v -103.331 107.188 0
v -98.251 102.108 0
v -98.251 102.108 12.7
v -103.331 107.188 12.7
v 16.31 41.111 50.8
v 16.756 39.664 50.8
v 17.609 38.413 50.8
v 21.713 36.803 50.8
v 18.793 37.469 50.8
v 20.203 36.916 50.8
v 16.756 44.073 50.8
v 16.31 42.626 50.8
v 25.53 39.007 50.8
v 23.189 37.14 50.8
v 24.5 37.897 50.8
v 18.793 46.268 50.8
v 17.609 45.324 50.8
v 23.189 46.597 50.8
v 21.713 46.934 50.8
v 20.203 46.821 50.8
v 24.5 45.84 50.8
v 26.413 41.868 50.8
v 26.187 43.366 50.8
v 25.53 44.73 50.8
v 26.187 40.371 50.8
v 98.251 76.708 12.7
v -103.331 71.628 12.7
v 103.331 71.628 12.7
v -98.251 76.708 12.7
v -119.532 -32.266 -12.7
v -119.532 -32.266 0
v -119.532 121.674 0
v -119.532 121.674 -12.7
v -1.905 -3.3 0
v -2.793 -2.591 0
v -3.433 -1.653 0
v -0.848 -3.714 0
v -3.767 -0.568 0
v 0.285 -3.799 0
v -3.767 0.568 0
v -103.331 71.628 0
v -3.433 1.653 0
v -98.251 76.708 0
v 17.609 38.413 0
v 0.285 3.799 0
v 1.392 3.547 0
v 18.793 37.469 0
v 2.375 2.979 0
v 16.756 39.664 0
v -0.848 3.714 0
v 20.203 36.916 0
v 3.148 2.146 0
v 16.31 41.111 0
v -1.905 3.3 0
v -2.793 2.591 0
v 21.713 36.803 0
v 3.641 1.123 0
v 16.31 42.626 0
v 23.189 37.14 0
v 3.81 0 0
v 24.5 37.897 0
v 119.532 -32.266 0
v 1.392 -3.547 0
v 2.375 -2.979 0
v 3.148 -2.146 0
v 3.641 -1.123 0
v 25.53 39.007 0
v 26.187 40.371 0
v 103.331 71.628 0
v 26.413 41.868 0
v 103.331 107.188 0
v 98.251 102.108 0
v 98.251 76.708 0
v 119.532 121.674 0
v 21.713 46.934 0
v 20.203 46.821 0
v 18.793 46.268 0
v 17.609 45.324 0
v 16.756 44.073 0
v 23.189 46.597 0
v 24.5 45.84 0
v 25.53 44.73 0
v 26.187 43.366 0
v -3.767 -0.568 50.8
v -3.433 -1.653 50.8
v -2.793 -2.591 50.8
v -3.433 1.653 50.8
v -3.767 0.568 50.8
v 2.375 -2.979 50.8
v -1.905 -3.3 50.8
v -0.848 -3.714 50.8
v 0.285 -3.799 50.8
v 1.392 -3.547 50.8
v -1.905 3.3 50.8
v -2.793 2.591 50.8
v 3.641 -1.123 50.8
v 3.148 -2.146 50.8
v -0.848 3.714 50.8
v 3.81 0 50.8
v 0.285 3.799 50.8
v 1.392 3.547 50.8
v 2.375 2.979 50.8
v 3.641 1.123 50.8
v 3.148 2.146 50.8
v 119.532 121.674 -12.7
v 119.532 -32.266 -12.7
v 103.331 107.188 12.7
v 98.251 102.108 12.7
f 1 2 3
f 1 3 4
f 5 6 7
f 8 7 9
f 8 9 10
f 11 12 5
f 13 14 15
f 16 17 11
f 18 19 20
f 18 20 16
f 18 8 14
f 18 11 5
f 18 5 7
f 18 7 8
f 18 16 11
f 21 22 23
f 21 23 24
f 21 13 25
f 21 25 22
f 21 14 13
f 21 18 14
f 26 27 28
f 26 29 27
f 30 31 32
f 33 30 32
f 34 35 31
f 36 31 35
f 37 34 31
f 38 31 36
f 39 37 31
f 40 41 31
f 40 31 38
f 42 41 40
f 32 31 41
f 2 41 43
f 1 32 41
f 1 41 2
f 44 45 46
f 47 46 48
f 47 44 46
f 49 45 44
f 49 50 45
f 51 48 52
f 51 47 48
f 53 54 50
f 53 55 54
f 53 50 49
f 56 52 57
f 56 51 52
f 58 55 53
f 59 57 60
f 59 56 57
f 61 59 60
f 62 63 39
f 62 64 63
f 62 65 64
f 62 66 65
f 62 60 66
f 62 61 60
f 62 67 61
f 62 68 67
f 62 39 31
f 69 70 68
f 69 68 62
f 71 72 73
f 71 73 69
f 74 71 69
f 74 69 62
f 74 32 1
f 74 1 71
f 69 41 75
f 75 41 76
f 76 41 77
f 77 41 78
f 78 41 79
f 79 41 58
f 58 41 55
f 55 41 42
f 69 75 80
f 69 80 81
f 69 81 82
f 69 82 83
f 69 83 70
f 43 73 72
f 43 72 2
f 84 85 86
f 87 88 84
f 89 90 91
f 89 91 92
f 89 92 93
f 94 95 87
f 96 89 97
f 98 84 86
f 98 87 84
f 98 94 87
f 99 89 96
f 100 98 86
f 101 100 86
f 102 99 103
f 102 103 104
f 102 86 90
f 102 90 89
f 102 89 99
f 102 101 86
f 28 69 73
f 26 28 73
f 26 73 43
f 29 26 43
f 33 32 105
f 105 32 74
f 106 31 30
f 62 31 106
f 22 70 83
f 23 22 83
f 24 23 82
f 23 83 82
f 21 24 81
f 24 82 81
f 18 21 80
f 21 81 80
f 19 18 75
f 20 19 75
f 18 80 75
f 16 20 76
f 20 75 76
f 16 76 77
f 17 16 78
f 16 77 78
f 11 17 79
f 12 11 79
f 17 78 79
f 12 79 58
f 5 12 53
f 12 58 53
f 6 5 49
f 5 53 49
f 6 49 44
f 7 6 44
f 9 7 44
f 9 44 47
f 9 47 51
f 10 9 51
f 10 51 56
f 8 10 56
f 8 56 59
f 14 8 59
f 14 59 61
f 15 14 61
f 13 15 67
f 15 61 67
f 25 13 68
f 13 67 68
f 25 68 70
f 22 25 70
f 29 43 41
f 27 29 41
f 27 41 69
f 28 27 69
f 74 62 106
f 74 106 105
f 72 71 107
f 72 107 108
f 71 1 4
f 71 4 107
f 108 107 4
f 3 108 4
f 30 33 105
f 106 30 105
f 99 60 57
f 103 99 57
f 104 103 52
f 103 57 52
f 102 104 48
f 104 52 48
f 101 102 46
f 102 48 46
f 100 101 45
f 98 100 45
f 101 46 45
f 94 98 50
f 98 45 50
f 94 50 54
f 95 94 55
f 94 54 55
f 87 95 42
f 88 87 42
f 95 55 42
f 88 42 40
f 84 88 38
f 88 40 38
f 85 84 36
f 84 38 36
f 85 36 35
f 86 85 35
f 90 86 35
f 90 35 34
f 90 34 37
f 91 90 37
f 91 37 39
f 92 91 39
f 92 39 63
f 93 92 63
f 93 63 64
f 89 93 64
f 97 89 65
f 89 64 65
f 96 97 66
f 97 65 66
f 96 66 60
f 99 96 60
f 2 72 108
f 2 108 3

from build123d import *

# Parameters (mm, degrees)
BOSS_EXTRUDE2_DEPTH   = 12.7
BOSS_EXTRUDE2_2_DEPTH = 12.7
SKETCH2_7_W           = 239.064376672
SKETCH2_7_H           = 153.94029831
BOSS_EXTRUDE3_DEPTH   = 12.7
SKETCH2_8_R           = 3.81
SKETCH2_8_R_2         = 5.08
BOSS_EXTRUDE4_DEPTH   = 50.8


with BuildPart() as part:
    # Sketch2 → Boss-Extrude2 (new body)
    with BuildSketch(Plane.XY):
        Polygon((-103.331182916, 107.188), (-98.251182916, 102.108), (98.251182916, 102.108), (103.331182916, 107.188), align=None)
    extrude(amount=BOSS_EXTRUDE2_DEPTH)



with BuildPart() as body_2:
    # Sketch2 → Boss-Extrude2 2 (new body)
    with BuildSketch(Plane.XY):
        Polygon((103.331182916, 71.628), (98.251182916, 76.708), (-98.251182916, 76.708), (-103.331182916, 71.628), align=None)
    extrude(amount=BOSS_EXTRUDE2_2_DEPTH)


with BuildPart() as part_1:
    add(part.part)

    add(body_2.part)  # Boss-Extrude3 merges body 2
    # Sketch2<7> → Boss-Extrude3 (add)
    with BuildSketch(Plane.XY):
        with Locations((0, 44.704)):
            Rectangle(SKETCH2_7_W, SKETCH2_7_H)
    extrude(amount=-BOSS_EXTRUDE3_DEPTH)

    # Sketch2<8> → Boss-Extrude4 (add)
    with BuildSketch(Plane.XY):
        Circle(SKETCH2_8_R)
        with Locations((21.333013583, 41.868396572)):
            Circle(SKETCH2_8_R_2)
    extrude(amount=BOSS_EXTRUDE4_DEPTH)


solid = part_1.part
